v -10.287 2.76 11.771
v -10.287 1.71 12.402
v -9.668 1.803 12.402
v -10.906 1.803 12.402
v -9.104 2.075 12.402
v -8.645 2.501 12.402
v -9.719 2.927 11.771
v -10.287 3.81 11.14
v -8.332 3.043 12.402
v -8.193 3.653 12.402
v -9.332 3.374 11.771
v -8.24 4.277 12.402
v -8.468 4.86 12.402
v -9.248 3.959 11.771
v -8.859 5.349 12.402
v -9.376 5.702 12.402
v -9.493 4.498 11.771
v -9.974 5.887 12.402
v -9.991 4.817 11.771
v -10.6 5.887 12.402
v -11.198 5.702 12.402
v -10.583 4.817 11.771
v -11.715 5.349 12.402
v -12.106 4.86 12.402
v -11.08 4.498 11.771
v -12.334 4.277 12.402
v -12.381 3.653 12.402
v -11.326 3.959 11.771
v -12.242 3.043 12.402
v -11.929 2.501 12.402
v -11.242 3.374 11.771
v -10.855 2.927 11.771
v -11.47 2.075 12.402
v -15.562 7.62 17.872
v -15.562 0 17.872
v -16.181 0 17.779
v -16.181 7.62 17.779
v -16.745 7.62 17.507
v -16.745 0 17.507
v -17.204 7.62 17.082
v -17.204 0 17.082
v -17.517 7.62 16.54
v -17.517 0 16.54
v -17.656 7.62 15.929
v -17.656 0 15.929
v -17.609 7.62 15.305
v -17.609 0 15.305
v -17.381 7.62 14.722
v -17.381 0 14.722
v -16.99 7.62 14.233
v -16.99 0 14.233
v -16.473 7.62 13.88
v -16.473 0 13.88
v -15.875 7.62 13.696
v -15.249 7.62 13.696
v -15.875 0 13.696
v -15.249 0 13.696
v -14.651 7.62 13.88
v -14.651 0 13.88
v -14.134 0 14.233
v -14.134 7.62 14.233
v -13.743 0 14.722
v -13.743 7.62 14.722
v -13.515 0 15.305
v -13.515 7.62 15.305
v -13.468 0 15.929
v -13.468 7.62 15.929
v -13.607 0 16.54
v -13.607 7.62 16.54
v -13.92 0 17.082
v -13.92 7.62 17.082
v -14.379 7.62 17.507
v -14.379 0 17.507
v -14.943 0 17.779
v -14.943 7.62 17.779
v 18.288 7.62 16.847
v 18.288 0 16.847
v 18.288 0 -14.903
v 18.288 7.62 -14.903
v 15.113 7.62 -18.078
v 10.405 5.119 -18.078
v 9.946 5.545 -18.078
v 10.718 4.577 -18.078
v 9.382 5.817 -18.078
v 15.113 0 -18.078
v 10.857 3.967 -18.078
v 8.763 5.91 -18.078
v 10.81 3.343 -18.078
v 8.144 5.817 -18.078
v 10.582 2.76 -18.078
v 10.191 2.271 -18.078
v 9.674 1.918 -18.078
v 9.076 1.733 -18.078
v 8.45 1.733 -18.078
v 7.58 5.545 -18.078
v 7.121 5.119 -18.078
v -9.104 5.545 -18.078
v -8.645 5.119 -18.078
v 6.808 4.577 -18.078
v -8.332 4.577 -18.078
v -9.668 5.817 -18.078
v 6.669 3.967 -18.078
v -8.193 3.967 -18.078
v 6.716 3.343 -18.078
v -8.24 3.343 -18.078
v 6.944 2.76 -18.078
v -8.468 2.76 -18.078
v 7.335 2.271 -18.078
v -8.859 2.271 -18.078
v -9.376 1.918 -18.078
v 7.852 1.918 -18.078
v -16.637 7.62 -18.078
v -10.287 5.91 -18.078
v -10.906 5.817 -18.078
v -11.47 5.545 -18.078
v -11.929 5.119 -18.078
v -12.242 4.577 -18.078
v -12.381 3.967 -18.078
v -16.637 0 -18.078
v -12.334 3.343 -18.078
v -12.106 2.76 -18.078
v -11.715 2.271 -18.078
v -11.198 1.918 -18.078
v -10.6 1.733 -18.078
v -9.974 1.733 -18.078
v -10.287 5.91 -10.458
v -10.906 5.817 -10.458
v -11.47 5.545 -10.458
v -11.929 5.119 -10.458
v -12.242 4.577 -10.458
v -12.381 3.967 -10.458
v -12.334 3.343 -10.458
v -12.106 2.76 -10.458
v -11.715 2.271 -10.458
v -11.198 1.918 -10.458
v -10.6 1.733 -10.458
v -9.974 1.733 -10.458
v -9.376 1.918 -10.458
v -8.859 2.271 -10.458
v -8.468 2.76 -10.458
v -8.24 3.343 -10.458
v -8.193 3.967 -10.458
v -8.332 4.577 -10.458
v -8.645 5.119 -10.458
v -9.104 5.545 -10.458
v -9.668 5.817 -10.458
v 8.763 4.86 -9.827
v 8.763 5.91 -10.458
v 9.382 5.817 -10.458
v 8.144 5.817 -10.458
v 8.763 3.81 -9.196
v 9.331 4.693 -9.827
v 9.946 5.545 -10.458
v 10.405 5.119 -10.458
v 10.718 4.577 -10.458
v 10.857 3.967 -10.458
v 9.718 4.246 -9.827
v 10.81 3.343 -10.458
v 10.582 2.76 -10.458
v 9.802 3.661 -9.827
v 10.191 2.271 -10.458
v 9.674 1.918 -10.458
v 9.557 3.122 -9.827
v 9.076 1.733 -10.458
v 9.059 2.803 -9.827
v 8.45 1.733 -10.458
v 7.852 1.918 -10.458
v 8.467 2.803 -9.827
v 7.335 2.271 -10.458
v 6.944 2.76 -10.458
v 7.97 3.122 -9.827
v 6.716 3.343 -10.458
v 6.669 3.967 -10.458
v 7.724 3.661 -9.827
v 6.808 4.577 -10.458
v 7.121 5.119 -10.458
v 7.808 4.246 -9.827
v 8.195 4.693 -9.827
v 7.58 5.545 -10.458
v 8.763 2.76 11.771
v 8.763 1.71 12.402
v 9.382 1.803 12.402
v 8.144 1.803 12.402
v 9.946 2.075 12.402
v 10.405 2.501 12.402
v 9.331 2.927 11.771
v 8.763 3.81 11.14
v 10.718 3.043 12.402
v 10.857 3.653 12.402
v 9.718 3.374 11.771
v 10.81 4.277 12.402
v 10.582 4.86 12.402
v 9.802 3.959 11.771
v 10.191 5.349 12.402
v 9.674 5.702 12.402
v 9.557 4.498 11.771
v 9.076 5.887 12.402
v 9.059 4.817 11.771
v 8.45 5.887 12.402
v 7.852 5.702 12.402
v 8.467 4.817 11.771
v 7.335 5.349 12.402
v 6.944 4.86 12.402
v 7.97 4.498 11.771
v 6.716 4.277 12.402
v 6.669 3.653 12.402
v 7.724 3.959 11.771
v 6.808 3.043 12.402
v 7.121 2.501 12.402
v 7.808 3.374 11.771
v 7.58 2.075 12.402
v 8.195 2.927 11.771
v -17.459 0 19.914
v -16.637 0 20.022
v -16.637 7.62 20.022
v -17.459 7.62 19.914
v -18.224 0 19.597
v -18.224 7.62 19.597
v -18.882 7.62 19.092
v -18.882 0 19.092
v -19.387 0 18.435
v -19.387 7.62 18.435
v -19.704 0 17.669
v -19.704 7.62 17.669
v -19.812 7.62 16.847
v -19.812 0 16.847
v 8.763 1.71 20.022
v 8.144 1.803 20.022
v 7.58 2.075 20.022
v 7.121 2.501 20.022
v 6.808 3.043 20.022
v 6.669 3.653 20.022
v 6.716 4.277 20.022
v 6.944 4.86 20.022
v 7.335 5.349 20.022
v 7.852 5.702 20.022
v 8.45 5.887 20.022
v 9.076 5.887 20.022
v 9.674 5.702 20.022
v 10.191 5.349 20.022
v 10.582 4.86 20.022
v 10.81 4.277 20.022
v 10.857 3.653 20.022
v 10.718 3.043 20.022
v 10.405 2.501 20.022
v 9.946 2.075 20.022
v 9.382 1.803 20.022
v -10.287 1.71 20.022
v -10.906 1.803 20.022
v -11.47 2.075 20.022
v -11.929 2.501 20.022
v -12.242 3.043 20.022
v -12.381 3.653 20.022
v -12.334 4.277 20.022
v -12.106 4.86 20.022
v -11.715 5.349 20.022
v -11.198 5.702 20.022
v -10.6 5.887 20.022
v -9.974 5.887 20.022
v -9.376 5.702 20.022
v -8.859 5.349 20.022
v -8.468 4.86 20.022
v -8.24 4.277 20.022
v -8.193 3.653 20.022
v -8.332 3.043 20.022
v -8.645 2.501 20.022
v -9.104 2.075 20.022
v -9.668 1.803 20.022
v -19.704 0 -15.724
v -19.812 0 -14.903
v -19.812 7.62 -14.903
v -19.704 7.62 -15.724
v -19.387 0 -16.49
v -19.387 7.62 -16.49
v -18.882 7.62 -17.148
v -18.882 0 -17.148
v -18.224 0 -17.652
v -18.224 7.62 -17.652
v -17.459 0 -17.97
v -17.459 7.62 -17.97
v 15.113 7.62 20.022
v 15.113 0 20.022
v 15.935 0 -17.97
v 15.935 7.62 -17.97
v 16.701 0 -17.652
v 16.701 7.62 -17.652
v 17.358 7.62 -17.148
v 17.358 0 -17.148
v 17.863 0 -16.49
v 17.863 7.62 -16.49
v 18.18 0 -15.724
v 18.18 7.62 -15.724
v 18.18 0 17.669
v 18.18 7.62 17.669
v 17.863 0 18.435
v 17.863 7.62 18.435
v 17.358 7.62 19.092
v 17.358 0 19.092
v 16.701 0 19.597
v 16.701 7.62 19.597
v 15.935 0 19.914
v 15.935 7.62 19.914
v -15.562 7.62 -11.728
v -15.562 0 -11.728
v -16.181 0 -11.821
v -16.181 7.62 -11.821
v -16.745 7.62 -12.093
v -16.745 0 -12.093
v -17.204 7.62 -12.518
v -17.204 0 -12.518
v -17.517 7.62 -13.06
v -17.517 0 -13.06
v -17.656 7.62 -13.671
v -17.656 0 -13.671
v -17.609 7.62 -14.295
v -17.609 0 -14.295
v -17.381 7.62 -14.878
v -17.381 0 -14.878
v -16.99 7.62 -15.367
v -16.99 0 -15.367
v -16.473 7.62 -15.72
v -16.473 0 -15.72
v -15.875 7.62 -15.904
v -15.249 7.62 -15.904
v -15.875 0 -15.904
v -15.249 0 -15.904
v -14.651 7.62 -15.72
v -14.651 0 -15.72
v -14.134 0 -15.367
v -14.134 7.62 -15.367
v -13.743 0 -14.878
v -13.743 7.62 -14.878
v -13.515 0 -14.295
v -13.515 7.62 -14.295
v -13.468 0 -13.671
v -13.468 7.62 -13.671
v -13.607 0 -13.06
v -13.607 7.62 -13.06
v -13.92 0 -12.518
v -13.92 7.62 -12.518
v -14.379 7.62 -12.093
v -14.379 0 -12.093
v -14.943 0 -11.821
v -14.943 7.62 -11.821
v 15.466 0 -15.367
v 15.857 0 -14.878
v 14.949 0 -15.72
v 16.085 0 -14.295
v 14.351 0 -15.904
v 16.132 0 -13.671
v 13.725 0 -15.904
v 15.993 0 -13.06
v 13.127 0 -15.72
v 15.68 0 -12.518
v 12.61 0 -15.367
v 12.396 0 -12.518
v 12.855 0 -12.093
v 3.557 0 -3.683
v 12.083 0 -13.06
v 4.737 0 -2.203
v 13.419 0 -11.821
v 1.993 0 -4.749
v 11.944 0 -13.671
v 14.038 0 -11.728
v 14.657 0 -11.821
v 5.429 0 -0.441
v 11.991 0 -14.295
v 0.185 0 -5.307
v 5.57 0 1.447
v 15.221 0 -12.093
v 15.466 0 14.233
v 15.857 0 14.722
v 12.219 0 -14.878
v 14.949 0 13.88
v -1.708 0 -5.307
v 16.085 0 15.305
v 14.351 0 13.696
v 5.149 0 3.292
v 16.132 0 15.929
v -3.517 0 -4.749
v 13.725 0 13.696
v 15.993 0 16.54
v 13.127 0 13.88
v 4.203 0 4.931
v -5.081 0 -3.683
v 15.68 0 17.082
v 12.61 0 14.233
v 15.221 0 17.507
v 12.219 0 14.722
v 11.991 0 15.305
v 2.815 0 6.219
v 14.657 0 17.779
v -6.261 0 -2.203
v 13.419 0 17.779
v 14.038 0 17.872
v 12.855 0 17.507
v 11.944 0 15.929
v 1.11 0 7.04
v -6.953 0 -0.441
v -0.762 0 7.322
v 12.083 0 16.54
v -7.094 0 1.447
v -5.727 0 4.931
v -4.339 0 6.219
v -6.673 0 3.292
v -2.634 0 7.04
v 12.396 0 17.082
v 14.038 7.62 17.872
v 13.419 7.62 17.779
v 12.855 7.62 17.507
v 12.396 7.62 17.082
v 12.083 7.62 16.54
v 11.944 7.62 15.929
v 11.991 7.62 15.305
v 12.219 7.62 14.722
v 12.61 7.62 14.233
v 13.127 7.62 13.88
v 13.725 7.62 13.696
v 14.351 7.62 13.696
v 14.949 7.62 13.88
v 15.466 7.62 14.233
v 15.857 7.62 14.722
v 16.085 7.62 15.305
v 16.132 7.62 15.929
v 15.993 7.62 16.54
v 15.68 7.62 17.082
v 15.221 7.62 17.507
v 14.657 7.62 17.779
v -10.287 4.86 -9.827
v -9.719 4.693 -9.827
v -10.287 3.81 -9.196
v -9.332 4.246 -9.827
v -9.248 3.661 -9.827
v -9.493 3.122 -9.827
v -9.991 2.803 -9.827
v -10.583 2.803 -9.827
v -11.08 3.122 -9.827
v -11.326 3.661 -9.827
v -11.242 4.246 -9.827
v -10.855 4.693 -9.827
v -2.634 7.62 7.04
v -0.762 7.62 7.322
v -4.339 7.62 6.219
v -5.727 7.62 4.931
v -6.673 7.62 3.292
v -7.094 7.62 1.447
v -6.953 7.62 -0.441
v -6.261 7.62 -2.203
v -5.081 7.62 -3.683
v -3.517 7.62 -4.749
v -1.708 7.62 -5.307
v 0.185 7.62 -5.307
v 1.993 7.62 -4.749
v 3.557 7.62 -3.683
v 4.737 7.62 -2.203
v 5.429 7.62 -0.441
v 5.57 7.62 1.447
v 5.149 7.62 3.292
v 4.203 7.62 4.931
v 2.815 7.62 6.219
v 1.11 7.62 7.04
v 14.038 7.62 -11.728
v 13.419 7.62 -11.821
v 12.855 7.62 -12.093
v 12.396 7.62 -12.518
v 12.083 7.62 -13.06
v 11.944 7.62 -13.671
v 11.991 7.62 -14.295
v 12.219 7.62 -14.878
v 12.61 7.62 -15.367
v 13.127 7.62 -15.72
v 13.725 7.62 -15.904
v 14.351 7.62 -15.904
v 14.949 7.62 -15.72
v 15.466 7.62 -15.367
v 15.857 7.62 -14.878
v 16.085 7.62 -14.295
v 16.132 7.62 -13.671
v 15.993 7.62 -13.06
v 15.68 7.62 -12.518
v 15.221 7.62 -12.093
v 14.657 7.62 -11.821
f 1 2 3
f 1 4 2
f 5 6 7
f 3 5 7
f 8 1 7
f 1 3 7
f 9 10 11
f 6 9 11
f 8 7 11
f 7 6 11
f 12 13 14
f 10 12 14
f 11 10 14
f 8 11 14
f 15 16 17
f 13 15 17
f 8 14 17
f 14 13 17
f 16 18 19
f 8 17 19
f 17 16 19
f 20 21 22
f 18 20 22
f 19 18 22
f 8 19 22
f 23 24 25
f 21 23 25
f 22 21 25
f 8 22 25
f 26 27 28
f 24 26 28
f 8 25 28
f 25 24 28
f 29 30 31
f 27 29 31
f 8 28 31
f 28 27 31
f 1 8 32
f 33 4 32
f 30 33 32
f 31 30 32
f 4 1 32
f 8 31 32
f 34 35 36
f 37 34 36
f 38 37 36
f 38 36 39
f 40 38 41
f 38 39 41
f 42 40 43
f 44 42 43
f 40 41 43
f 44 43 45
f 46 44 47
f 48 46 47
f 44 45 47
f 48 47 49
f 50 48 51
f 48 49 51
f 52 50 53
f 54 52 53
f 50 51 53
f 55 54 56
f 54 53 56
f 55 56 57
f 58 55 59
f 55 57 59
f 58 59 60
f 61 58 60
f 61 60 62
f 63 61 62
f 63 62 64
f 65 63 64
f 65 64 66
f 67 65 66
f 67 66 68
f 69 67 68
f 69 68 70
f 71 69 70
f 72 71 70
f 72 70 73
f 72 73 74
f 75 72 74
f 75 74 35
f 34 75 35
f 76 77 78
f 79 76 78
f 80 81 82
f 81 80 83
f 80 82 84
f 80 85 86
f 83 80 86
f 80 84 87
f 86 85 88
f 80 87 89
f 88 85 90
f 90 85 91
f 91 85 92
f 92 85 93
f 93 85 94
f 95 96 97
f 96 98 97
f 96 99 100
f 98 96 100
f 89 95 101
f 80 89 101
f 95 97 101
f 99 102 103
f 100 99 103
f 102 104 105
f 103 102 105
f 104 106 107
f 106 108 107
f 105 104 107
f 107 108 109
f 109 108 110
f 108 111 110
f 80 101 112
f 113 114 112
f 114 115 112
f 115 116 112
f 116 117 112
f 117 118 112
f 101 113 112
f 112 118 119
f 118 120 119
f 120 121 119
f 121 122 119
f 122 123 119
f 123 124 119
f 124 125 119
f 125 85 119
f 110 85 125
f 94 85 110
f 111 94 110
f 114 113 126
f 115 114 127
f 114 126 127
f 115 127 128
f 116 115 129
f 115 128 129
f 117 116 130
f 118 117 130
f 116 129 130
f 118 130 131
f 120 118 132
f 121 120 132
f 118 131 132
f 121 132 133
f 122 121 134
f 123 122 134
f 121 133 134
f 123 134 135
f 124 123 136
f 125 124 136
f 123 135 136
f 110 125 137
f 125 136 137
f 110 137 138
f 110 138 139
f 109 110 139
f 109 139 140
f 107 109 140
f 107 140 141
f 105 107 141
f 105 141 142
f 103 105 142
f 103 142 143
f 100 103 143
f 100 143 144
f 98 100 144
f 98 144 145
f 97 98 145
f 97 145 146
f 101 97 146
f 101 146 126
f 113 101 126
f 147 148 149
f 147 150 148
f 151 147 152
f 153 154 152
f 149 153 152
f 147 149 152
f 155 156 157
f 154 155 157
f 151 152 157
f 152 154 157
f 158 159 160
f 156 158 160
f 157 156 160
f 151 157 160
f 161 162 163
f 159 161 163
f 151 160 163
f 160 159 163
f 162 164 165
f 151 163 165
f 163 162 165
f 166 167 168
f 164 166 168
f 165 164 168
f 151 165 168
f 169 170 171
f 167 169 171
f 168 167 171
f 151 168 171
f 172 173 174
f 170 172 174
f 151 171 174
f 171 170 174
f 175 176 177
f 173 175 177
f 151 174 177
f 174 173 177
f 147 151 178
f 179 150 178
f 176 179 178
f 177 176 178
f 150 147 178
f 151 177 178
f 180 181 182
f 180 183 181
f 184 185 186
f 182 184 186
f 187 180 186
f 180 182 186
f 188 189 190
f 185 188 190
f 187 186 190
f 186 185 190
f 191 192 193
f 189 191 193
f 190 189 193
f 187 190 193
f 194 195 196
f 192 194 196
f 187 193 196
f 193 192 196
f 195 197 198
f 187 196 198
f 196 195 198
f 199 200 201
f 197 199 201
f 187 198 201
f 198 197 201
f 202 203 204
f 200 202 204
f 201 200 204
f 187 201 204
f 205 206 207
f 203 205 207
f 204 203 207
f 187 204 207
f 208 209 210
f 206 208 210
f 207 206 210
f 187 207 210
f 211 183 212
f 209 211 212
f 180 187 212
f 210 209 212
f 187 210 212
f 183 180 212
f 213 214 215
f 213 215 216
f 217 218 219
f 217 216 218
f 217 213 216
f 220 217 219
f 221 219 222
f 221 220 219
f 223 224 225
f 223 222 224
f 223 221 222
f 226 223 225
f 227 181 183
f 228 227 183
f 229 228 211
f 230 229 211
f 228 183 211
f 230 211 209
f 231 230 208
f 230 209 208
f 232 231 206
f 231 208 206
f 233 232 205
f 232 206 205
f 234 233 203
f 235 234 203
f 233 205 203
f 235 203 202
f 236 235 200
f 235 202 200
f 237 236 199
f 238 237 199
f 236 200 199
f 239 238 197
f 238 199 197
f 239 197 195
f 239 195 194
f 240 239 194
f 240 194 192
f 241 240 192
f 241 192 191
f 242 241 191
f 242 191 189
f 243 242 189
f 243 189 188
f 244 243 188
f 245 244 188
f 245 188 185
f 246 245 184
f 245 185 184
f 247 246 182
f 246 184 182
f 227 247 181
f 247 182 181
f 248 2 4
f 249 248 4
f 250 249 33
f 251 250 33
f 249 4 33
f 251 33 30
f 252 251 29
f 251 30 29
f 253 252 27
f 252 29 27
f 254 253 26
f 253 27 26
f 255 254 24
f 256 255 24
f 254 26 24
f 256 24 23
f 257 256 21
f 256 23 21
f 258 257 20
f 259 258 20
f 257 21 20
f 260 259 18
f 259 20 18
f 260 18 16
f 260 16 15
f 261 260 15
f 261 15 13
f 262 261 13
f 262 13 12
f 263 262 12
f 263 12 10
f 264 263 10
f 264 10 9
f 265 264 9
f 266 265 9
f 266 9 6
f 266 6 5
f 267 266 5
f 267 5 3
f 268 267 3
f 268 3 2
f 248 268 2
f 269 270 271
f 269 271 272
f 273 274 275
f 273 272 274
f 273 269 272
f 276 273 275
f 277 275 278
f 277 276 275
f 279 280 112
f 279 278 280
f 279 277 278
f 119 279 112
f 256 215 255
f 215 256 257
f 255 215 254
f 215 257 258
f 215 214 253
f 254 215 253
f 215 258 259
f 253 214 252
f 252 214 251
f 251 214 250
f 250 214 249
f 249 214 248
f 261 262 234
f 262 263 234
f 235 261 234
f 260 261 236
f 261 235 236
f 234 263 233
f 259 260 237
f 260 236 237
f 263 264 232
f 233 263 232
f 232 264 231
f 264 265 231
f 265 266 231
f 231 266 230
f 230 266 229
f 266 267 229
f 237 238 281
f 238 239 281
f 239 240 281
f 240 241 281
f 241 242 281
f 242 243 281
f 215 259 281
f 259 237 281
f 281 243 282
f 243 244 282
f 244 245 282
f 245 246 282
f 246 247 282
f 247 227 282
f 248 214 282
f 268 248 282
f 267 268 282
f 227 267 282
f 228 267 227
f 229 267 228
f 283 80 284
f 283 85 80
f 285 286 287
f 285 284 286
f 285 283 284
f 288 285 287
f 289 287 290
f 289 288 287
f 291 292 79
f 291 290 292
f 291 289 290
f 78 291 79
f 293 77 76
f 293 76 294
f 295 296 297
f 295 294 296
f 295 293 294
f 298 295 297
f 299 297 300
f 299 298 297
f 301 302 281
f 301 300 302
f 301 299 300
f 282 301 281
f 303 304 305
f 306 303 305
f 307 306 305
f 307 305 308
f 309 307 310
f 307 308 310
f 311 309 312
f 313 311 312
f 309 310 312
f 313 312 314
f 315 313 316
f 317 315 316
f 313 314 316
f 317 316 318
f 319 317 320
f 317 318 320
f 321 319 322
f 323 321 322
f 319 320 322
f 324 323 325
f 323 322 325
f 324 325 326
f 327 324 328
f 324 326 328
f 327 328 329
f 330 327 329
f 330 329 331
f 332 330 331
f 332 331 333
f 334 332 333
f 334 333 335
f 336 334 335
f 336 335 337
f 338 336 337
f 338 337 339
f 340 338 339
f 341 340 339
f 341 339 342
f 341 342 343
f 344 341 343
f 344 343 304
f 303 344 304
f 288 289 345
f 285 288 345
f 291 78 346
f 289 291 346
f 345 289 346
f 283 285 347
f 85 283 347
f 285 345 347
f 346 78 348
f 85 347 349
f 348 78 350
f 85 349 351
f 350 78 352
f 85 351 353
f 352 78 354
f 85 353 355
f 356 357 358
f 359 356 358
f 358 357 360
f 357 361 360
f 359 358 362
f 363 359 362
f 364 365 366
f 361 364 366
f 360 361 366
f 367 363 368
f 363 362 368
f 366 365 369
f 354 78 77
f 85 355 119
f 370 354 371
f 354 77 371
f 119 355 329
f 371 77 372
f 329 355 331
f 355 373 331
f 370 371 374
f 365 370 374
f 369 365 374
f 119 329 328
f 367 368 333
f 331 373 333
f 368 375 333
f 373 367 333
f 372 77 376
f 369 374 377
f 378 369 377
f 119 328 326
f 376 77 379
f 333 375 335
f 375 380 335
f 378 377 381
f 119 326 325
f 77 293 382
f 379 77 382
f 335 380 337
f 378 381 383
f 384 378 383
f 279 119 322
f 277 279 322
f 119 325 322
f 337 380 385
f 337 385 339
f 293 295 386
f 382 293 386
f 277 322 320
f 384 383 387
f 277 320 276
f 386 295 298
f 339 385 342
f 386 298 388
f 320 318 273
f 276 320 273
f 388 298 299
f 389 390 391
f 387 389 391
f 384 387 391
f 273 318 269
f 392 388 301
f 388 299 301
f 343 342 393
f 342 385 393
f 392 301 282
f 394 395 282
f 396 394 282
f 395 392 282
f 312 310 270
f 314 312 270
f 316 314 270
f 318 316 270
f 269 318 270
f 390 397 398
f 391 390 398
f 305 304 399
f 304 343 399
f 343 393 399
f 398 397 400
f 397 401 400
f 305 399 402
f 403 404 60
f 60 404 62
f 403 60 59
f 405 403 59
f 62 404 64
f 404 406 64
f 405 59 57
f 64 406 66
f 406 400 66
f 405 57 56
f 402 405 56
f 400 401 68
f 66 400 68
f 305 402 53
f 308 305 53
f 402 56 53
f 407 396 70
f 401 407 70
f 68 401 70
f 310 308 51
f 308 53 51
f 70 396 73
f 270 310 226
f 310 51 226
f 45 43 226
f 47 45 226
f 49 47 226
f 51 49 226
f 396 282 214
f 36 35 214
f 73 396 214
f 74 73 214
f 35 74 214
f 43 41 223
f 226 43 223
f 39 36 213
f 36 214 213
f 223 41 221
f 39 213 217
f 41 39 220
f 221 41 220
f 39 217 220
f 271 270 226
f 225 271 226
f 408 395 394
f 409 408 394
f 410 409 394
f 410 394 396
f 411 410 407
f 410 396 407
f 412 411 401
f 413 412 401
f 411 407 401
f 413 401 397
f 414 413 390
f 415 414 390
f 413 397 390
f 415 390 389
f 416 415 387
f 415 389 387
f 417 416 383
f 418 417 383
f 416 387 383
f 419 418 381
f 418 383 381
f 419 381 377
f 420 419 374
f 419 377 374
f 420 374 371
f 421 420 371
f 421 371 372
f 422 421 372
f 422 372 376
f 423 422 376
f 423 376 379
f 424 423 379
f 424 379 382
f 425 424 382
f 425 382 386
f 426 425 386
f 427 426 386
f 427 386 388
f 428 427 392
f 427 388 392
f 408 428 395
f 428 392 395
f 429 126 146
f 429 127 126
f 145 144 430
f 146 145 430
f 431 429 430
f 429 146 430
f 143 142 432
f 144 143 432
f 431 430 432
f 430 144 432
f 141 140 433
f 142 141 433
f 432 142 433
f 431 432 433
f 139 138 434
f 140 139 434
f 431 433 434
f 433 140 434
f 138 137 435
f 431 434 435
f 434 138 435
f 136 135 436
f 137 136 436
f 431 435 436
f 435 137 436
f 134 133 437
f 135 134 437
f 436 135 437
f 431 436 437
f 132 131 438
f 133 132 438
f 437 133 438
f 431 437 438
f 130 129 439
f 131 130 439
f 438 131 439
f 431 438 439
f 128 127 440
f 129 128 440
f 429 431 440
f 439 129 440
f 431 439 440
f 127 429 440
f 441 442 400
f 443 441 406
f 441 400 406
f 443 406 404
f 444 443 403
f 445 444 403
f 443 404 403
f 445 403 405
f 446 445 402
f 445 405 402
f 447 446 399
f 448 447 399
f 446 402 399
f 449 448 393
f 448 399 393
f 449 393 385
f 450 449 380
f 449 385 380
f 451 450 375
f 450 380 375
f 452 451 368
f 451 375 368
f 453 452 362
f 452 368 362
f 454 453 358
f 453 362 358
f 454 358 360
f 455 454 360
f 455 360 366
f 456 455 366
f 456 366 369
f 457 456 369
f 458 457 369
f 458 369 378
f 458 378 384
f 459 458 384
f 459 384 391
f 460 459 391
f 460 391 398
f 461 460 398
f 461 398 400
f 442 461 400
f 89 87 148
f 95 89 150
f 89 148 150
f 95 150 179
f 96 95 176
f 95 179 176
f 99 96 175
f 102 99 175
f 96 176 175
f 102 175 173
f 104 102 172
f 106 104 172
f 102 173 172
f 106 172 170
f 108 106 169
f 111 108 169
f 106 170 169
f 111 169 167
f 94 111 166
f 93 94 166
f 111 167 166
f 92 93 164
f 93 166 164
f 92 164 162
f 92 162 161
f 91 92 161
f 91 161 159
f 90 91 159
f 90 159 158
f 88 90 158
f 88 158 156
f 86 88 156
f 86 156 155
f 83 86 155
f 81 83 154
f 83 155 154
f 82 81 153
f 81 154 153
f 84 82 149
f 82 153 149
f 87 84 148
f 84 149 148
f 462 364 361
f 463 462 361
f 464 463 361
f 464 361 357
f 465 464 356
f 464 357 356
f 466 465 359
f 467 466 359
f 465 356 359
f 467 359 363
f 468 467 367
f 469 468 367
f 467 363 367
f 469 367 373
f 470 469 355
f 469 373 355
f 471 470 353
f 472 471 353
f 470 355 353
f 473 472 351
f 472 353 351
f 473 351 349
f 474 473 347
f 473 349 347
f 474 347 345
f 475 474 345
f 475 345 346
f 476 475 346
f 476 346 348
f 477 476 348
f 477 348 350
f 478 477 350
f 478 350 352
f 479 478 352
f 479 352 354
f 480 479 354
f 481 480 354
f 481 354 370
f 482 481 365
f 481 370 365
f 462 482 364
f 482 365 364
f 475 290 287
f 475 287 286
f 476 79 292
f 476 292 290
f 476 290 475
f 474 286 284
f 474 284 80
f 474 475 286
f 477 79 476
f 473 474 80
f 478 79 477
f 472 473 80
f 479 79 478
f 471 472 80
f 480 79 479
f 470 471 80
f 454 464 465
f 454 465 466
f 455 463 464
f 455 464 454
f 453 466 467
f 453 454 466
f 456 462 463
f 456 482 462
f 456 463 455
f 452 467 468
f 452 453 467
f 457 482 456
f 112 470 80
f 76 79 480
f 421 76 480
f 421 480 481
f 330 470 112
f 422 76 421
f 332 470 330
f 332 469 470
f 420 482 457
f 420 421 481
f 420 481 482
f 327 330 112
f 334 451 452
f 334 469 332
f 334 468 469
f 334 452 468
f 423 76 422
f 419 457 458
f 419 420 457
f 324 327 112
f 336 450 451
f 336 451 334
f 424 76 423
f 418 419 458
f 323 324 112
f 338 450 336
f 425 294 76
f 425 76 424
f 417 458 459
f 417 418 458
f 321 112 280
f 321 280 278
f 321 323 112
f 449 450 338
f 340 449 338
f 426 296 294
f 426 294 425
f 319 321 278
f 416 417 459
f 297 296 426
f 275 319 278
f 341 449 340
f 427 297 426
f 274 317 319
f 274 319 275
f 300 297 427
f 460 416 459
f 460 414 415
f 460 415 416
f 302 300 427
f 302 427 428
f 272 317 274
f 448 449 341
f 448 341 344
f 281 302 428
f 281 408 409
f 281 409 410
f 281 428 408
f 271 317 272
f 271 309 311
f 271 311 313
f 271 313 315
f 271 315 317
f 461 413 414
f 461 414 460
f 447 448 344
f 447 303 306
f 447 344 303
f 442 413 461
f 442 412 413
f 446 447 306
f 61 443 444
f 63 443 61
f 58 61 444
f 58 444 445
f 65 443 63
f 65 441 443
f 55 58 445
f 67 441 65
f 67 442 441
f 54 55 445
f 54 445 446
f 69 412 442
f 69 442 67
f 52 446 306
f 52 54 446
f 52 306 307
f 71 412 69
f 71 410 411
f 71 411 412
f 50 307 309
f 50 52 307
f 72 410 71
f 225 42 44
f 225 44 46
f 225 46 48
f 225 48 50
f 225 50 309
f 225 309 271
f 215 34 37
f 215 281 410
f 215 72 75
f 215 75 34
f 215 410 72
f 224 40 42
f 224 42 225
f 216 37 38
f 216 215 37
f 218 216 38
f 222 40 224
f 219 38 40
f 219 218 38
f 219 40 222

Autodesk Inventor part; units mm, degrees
ref_plane "YZ Plane" through (0, 0, 0) normal (1, 0, 0) x (0, 1, 0)
ref_plane "XZ Plane" through (0, 0, 0) normal (0, 1, 0) x (-1, 0, 0)
ref_plane "XY Plane" through (0, 0, 0) normal (0, 0, 1) x (1, 0, 0)
sketch "Sketch1" plane through (0, 0, 0) normal (0, 1, 0) x (-1, 0, 0)
  line L0 (16.6369, 20.0223) -> (-15.1131, 20.0223)
  line L1 (-18.2881, 16.8473) -> (-18.2881, -14.9027)
  line L2 (-15.1131, -18.0777) -> (16.6369, -18.0777)
  line L3 (19.8119, -14.9027) -> (19.8119, 16.8473)
  arc A0 (19.8119, 16.8473) -> (16.6369, 20.0223) centre (16.6369, 16.8473) ccw
  arc A1 (-18.2881, -14.9027) -> (-15.1131, -18.0777) centre (-15.1131, -14.9027) ccw
  arc A2 (16.6369, -18.0777) -> (19.8119, -14.9027) centre (16.6369, -14.9027) ccw
  arc A3 (-15.1131, 20.0223) -> (-18.2881, 16.8473) centre (-15.1131, 16.8473) ccw
  point P0 (0, 0)
  dimension "d0" = 38.1
  dimension "d1" = 3.175
extrude "Extrusion1" add sketch "Sketch1" along normal blind 7.62
sketch "Sketch2" plane through (0, 7.62, 0) normal (0, 1, 0) x (1, 0, 0)
  line L0 (-19.8119, 14.9027) -> (-19.8119, -16.8473) projected
  line L1 (-16.6369, -20.0223) -> (15.1131, -20.0223) projected
  line L2 (15.1131, 18.0777) -> (-16.6369, 18.0777) projected
  line L3 (18.2881, -16.8473) -> (18.2881, 14.9027) projected
  point P0 (0, 0)
  point P1 (-15.5619, -15.7723)
  point P2 (-15.5619, 13.8277)
  point P3 (14.0381, 13.8277)
  point P4 (14.0381, -15.7723)
  dimension "d4" = 4.25
  dimension "d5" = 4.25
  dimension "d6" = 4.25
  dimension "d7" = 4.25
  dimension "d8" = 4.25
  dimension "d9" = 4.25
  dimension "d10" = 4.25
  dimension "d11" = 4.25
hole "Hole1" at (-15.5619, 7.62, 15.7723) at (-15.5619, 7.62, -13.8277) at (14.0381, 7.62, -13.8277) at (14.0381, 7.62, 15.7723) direction (0, -1, 0) diameter 4.2 end through all
sketch "Sketch3" plane through (0, 7.62, 0) normal (0, 1, 0) x (1, 0, 0)
  line L0 (-19.8119, 14.9027) -> (-19.8119, -16.8473) construction
  line L1 (-19.8119, -0.9723) -> (18.2881, -0.9723) construction
  line L2 (18.2881, -16.8473) -> (18.2881, 14.9027) construction
  point P0 (0, 0)
  point P1 (-0.7619, -0.9723)
  point P2 (-0.7619, -0.9723)
hole "Hole2" at (-0.7619, 7.62, 0.9723) direction (0, -1, 0) diameter 12.7 end through all
sketch "Sketch4" plane through (-16.6369, 0, 20.0223) normal (0, 0, 1) x (1, 0, 0)
  line L0 (31.75, 0) -> (31.75, 7.62) construction
  line L1 (31.75, 3.81) -> (0, 3.81) construction
  line L2 (0, 0) -> (0, 7.62) construction
  line L3 (-3.175, 0) -> (-3.175, 7.62) construction
  line L4 (34.925, 0) -> (34.925, 7.62) construction
  point P0 (16.6369, 0)
  point P1 (6.35, 3.81)
  point P2 (25.4, 3.81)
  dimension "d26" = 9.525
  dimension "d27" = 9.525
hole "Hole3" at (-10.2869, 3.81, 20.0223) at (8.7631, 3.81, 20.0223) direction (0, 0, -1) diameter 4.2 depth 7.62 tip angle 118
sketch "Sketch5" plane through (15.1131, 0, -18.0777) normal (0, 0, -1) x (-1, 0, 0)
  line L0 (-3.175, 0) -> (-3.175, 7.62) construction
  line L1 (34.925, 0) -> (34.925, 7.62) construction
  line L2 (31.75, 0) -> (31.75, 7.62) construction
  line L3 (0, 0) -> (0, 7.62) construction
  line L4 (0, 0) -> (0, 7.62) construction
  line L5 (0, 3.81) -> (31.75, 3.81) construction
  line L6 (31.75, 0) -> (31.75, 7.62) construction
  point P0 (15.1131, 0)
  point P1 (6.35, 3.81)
  point P2 (25.4, 3.81)
  dimension "d35" = 9.525
  dimension "d36" = 9.525
hole "Hole4" at (8.7631, 3.81, -18.0777) at (-10.2869, 3.81, -18.0777) direction (0, 0, 1) diameter 4.2 depth 7.62 tip angle 118
equation "\"d5\" = d4"
equation "\"d6\" = d4"
equation "\"d7\" = d4"
equation "\"d8\" = d4"
equation "\"d9\" = d4"
equation "\"d10\" = d4"
equation "\"d11\" = d4"
equation "\"d27\" = d26"
equation "\"d35\" = d26"
equation "\"d36\" = d26"
properties part number "Bearing_Block" material "Steel, Mild"
